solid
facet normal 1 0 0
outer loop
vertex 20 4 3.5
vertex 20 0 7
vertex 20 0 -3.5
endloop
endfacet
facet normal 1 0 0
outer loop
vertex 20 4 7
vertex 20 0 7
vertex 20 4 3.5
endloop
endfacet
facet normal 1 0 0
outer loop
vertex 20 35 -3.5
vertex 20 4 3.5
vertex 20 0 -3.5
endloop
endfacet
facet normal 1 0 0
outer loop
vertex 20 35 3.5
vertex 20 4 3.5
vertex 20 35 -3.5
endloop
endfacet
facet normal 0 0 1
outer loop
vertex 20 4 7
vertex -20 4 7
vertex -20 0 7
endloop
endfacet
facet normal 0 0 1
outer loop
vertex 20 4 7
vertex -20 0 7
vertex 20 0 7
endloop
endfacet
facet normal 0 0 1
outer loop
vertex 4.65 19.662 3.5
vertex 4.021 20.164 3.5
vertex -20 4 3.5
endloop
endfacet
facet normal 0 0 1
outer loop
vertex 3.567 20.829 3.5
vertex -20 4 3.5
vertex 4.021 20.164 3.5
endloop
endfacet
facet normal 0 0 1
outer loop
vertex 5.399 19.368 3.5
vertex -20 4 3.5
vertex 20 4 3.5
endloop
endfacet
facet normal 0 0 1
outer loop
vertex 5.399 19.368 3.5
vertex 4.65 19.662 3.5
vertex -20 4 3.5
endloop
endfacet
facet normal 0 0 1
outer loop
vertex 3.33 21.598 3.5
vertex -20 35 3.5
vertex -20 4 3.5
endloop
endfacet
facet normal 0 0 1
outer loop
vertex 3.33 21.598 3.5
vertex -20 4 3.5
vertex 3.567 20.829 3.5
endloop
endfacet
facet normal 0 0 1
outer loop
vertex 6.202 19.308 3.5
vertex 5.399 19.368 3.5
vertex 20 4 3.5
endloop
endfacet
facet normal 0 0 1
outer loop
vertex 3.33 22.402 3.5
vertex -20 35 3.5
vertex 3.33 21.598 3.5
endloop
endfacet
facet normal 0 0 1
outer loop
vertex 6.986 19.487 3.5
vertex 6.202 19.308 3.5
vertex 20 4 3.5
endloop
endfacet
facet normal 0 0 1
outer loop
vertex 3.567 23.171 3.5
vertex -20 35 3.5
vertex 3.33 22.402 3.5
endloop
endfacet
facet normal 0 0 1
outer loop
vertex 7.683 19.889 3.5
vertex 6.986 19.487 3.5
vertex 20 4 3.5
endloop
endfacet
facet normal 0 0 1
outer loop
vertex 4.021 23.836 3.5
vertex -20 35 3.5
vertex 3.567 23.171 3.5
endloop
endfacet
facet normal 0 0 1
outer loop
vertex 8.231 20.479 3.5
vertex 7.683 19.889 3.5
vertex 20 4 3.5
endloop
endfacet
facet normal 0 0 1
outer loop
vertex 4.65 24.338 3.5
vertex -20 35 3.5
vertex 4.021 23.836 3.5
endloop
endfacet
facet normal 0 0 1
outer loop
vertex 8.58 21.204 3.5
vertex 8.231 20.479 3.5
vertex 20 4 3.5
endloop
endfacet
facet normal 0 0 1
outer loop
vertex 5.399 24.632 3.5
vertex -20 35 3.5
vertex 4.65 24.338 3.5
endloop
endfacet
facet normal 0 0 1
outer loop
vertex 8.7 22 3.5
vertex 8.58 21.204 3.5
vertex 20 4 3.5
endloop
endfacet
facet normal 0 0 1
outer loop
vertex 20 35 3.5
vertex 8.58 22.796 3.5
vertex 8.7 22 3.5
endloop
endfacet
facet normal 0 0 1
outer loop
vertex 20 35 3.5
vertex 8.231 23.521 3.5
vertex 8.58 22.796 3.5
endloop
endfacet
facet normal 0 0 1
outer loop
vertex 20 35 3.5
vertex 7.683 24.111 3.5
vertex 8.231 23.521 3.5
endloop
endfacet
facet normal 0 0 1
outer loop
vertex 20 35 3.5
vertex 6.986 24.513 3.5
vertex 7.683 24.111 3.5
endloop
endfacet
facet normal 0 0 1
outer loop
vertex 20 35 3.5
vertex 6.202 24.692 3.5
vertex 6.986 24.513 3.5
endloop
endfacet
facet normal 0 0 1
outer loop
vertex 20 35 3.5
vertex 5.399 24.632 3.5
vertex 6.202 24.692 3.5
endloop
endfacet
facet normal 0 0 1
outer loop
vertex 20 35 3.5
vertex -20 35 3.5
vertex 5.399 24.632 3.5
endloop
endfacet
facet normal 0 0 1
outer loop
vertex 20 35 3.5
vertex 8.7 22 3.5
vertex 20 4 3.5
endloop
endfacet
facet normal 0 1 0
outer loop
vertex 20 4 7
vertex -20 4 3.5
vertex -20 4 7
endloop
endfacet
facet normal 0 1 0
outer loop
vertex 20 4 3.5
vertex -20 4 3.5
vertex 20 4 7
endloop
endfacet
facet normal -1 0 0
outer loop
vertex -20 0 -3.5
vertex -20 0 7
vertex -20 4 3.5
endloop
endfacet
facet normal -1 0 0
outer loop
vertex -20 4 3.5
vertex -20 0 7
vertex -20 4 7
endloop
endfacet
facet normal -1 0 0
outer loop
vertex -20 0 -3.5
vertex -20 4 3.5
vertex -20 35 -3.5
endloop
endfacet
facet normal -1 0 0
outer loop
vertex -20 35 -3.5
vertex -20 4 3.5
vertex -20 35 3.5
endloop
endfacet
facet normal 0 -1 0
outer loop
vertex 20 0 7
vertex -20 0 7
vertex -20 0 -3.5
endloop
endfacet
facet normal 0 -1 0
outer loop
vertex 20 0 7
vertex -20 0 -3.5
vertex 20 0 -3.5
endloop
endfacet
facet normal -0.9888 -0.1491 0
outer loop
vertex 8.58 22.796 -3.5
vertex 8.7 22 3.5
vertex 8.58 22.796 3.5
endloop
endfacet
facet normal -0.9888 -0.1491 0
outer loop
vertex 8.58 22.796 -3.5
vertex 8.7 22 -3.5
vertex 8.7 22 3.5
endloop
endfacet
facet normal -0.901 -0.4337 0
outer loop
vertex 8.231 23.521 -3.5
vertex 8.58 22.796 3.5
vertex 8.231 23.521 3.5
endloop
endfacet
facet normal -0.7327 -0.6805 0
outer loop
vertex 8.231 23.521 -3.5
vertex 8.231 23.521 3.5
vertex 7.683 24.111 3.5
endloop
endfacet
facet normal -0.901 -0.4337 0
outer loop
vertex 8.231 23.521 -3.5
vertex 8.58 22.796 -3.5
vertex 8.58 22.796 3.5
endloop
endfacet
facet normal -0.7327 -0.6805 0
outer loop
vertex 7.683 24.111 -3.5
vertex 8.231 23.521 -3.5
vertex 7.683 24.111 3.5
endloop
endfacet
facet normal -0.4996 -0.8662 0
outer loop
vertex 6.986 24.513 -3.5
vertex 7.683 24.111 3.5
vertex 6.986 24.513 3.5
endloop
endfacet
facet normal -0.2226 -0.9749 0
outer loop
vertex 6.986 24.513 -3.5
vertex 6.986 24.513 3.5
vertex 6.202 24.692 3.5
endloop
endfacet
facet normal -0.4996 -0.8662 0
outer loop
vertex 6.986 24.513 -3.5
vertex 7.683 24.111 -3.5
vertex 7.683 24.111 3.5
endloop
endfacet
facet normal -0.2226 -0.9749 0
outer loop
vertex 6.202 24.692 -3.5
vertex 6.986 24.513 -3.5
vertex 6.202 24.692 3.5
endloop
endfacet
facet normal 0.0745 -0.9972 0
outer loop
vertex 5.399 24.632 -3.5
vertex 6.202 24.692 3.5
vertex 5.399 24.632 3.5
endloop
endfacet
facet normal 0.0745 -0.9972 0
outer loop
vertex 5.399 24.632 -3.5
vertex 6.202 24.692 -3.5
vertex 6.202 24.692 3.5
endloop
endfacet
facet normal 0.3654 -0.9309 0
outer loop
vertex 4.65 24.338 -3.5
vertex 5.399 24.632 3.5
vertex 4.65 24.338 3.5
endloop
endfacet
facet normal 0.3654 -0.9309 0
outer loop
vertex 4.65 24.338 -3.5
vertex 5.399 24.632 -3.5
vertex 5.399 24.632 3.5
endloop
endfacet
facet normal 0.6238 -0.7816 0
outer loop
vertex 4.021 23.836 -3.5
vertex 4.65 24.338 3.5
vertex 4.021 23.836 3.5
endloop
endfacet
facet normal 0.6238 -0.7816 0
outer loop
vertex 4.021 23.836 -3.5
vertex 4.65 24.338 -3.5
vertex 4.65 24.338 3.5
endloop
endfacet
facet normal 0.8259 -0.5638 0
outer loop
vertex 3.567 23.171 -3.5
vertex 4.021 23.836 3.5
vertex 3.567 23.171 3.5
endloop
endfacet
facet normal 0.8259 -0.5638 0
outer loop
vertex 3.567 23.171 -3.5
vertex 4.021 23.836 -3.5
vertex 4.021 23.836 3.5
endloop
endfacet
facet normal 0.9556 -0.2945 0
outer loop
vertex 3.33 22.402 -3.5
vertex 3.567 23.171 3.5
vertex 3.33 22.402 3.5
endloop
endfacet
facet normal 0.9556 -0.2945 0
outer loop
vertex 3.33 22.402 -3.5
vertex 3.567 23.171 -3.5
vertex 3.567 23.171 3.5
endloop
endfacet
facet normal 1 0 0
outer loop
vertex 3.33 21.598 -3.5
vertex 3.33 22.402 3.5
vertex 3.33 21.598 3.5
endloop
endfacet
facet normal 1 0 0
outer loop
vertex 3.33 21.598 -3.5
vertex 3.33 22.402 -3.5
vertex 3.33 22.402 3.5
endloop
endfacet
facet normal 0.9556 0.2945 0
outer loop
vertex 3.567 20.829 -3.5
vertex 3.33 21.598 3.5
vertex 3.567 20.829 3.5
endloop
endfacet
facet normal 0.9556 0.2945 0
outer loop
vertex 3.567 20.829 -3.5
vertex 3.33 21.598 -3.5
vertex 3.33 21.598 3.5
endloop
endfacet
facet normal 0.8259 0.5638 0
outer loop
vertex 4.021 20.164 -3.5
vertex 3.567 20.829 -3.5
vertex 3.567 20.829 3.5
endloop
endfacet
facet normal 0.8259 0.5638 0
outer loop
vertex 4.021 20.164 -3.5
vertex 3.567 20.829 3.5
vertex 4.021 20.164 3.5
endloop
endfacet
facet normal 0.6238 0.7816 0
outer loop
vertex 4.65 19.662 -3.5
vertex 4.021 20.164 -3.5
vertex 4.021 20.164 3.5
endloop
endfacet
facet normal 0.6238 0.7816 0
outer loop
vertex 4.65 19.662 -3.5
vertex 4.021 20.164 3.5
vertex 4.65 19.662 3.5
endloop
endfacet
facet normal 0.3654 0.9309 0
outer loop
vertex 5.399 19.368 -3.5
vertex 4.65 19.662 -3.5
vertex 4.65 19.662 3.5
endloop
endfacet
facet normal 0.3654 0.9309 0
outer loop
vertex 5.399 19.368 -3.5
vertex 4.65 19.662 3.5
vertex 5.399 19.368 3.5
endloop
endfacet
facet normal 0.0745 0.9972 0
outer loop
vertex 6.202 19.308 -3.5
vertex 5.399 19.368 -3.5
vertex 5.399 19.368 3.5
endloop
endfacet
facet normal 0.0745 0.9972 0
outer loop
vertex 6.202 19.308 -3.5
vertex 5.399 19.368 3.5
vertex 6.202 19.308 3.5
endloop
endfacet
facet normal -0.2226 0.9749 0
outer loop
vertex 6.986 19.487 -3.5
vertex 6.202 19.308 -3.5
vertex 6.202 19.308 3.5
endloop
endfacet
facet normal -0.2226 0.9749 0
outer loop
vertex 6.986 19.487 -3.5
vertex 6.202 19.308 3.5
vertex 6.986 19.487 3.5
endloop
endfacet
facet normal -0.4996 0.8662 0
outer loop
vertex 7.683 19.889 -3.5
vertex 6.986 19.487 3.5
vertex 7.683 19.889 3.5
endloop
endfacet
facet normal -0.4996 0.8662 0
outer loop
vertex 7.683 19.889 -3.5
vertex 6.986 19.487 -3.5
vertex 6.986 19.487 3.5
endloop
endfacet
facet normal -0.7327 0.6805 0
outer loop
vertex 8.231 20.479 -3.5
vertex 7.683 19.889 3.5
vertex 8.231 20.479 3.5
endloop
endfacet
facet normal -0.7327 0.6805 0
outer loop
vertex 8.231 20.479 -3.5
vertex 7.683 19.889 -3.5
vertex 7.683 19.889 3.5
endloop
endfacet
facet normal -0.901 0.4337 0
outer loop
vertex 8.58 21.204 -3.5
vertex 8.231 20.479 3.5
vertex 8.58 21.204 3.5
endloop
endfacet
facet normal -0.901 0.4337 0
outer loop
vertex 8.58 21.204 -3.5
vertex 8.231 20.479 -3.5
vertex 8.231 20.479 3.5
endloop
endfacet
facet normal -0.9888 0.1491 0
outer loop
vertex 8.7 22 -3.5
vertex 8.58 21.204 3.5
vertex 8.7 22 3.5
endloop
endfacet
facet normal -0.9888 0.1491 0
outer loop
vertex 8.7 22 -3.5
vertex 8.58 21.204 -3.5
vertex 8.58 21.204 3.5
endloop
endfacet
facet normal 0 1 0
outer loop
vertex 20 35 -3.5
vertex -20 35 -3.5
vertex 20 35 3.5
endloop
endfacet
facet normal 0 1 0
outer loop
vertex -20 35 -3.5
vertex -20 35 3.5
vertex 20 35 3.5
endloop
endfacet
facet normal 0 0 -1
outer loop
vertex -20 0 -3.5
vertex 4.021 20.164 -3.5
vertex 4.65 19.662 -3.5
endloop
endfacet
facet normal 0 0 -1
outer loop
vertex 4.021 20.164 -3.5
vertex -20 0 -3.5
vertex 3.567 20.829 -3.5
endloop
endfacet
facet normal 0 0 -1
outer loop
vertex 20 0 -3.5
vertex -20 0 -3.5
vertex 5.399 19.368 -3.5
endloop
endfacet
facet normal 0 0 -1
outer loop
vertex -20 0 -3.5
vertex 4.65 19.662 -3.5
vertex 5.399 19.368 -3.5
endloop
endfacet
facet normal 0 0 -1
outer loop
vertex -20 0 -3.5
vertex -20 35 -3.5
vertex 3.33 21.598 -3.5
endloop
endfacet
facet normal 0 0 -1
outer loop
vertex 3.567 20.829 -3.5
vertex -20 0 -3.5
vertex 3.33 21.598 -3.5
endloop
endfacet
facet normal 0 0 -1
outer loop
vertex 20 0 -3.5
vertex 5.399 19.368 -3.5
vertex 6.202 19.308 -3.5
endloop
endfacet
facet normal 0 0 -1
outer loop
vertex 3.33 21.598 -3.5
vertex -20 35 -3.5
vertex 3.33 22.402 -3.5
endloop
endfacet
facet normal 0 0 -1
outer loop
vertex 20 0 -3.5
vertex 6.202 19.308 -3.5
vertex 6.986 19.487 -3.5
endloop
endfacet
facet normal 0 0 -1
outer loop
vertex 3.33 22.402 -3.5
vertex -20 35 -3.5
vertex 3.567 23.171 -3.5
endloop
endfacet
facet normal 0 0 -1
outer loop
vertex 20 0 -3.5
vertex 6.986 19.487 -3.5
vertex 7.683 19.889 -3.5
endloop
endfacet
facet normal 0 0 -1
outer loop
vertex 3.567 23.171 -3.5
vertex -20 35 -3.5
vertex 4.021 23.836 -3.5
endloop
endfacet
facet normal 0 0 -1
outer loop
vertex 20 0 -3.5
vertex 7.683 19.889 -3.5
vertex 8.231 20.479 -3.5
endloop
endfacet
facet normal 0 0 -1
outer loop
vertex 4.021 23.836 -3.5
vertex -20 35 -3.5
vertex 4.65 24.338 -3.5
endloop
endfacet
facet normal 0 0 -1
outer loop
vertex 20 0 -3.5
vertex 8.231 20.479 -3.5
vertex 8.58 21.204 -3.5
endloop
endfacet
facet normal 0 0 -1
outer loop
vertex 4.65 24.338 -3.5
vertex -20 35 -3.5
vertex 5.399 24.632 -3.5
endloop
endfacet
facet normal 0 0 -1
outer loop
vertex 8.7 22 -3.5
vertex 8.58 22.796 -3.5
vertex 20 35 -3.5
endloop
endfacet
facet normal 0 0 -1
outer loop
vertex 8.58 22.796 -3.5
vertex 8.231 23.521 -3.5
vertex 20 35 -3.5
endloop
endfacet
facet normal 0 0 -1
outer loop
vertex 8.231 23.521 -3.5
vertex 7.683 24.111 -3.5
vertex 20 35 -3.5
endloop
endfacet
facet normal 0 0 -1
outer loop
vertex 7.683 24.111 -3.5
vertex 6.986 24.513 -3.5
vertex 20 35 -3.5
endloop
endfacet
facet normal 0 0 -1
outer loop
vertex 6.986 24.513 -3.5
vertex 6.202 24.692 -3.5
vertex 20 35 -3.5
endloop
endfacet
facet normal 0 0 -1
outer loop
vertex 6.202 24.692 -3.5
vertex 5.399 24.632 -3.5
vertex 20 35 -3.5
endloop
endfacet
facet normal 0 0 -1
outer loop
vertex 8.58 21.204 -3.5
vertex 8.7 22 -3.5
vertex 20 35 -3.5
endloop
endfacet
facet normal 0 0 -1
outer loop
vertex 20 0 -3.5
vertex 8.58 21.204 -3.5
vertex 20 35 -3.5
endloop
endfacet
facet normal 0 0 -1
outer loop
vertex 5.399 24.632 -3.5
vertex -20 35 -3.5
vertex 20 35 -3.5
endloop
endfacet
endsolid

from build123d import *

# Parameters (mm, degrees)
SKETCH_1_W      = 40
SKETCH_1_H      = 35
SKETCH_1_R      = 2.7
EXTRUDE_1_DEPTH = 3.5
SKETCH_2_W      = 40
SKETCH_2_H      = 4
EXTRUDE_2_DEPTH = 7


with BuildPart() as part:
    # 草图1 → 凸台-拉伸1 (new, symmetric)
    with BuildSketch(Plane.XY):
        with Locations((0, 17.5)):
            Rectangle(SKETCH_1_W, SKETCH_1_H)
        with Locations((6, 22)):
            Circle(SKETCH_1_R, mode=Mode.SUBTRACT)
    extrude(amount=EXTRUDE_1_DEPTH, both=True)

    # 草图2 → 凸台-拉伸2 (add)
    with BuildSketch(Plane.XY):
        with Locations((0, 2)):
            Rectangle(SKETCH_2_W, SKETCH_2_H)
    extrude(amount=EXTRUDE_2_DEPTH)


solid = part.part
